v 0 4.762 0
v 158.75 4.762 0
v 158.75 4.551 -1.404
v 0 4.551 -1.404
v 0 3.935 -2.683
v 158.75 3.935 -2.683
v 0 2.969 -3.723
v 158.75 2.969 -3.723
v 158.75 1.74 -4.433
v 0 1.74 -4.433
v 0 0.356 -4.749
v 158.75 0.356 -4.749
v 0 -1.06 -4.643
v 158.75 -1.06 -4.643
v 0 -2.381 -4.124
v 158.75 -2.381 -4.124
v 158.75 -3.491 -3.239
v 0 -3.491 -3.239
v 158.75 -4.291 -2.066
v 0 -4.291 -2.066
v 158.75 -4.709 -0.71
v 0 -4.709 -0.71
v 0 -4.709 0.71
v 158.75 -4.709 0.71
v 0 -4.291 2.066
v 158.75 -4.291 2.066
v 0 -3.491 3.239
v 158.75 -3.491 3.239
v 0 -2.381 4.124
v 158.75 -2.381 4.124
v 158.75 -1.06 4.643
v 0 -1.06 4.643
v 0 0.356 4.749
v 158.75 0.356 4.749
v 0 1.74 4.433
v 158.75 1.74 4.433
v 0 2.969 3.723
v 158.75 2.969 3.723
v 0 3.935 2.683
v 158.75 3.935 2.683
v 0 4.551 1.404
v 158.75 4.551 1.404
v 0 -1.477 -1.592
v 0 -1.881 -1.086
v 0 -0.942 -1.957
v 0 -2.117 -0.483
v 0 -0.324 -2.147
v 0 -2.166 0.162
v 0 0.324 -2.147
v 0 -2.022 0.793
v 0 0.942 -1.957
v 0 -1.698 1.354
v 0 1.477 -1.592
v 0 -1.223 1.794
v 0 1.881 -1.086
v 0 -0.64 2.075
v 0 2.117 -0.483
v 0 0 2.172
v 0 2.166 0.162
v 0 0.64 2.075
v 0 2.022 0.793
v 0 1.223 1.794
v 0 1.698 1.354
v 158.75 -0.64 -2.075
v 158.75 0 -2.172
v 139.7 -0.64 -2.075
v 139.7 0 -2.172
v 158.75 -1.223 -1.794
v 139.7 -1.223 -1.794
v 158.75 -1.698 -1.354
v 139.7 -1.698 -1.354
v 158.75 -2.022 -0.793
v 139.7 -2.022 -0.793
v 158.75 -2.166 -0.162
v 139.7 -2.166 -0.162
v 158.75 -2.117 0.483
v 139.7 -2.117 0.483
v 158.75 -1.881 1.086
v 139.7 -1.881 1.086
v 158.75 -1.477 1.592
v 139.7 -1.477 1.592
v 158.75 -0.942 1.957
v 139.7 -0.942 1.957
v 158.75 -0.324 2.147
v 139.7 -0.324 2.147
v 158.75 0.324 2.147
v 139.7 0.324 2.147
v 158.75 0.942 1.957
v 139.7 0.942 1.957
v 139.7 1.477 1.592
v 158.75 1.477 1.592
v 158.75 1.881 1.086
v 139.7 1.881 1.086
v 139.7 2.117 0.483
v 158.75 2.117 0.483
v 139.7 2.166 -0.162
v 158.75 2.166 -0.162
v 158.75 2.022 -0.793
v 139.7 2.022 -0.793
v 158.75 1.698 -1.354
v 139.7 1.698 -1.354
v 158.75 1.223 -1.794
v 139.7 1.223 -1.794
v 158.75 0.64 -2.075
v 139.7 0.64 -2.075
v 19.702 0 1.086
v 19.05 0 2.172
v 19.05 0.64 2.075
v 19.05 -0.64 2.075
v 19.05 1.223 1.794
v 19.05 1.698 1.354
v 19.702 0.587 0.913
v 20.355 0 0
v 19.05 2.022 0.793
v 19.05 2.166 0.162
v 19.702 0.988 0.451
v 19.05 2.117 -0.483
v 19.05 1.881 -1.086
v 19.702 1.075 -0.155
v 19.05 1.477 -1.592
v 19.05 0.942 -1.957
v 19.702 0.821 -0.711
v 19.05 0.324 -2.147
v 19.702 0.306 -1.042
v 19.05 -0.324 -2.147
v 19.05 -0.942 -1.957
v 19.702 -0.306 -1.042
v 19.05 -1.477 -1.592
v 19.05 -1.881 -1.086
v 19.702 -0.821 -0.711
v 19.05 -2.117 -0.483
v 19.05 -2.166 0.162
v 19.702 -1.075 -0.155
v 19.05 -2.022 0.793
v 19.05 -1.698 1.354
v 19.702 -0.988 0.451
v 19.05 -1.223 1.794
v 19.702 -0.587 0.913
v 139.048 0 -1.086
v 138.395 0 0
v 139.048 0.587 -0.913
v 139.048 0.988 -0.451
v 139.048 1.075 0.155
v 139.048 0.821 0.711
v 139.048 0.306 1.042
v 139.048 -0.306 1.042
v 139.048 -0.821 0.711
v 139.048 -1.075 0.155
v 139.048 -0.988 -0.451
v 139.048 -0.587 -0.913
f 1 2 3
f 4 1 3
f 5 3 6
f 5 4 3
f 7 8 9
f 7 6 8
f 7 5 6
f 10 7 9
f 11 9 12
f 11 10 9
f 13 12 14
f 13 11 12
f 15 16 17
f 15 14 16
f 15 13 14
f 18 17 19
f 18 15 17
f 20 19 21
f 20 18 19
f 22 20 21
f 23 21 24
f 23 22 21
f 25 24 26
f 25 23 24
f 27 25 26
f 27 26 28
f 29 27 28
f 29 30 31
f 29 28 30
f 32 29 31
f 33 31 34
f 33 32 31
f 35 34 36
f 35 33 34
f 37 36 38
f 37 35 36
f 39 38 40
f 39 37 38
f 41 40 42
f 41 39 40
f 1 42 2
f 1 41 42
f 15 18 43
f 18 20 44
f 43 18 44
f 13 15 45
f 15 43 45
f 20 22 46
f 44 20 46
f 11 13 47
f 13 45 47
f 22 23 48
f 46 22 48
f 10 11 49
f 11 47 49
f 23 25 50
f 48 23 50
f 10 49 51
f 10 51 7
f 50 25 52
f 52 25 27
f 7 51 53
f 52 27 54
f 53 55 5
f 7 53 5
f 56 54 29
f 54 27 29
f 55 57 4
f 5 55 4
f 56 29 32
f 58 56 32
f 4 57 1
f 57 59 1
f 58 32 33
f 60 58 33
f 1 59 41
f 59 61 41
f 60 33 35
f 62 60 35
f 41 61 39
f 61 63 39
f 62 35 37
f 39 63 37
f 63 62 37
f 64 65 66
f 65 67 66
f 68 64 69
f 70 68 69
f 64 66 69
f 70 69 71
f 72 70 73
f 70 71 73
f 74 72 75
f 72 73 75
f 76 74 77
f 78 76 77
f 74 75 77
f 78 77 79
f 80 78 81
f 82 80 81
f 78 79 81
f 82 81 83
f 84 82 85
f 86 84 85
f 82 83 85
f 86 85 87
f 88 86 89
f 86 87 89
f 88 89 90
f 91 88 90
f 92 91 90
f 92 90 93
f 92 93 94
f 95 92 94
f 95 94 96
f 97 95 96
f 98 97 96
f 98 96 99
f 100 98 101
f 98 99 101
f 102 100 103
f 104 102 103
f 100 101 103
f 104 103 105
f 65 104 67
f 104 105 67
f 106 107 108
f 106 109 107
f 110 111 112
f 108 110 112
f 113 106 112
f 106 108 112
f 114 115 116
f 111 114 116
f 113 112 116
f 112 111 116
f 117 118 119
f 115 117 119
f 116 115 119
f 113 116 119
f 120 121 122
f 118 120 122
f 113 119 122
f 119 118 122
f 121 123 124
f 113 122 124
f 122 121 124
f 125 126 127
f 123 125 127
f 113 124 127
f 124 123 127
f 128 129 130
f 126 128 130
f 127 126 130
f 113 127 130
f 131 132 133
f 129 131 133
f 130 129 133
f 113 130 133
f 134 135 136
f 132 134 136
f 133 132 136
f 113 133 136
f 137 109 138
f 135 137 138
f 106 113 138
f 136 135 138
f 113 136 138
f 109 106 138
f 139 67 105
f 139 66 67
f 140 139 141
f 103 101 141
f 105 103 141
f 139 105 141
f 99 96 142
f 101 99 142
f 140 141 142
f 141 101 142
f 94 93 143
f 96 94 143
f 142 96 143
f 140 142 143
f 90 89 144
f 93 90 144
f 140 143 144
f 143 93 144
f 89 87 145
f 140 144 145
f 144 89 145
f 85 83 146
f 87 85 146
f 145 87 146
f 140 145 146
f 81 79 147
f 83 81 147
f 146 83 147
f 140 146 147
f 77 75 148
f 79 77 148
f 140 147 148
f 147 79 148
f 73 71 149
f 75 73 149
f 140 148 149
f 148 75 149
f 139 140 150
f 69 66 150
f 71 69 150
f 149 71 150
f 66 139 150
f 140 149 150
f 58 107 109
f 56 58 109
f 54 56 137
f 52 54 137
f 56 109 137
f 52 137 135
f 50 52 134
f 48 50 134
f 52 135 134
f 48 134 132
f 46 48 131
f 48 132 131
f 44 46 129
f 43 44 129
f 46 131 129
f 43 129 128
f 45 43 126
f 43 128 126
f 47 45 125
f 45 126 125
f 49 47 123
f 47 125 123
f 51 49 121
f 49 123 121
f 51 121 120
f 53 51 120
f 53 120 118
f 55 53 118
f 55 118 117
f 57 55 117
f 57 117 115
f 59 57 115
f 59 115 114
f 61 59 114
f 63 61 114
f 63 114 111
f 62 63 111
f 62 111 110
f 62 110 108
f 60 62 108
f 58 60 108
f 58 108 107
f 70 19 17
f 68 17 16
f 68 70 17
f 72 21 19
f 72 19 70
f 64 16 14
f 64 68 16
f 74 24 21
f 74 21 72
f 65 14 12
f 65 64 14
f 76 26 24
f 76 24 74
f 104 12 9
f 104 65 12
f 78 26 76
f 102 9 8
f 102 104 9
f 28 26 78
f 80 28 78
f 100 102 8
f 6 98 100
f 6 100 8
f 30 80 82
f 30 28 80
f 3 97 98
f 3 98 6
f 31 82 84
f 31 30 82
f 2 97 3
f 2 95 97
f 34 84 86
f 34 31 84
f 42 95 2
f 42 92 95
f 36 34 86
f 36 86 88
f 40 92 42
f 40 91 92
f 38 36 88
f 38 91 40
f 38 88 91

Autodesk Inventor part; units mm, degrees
ref_plane "YZ Plane" through (0, 0, 0) normal (1, 0, 0) x (0, 1, 0)
ref_plane "XZ Plane" through (0, 0, 0) normal (0, 1, 0) x (-1, 0, 0)
ref_plane "XY Plane" through (0, 0, 0) normal (0, 0, 1) x (1, 0, 0)
sketch "Sketch1" plane through (0, 0, 0) normal (1, 0, 0) x (0, 1, 0)
  circle A0 centre (0, 0) radius 4.7625
  dimension "d0" = 9.525
extrude "Extrusion1" add sketch "Sketch1" along normal blind 158.75
sketch "Sketch2" plane through (158.75, 0, 0) normal (1, 0, 0) x (0, 0, -1)
  circle A0 centre (0, 0) radius 4.7625 projected
hole "Hole1" at (158.75, 0, 0) direction (-1, 0, 0) diameter 4.3434 depth 19.05 tip angle 118 thread size "12-24 UNC" class "2B" standard "ANSI Unified Screw Threads"
sketch "Sketch3" plane through (0, 0, 0) normal (-1, 0, 0) x (0, 0, 1)
  circle A0 centre (0, 0) radius 2.1717 projected
hole "Hole2" at (0, 0, 0) direction (1, 0, 0) diameter 4.3434 depth 19.05 tip angle 118 thread size "12-24 UNC" class "2B" standard "ANSI Unified Screw Threads"
properties part number "STOCK,HOOD,SPACER,10-32,6.25in" material "Aluminum 6061"
